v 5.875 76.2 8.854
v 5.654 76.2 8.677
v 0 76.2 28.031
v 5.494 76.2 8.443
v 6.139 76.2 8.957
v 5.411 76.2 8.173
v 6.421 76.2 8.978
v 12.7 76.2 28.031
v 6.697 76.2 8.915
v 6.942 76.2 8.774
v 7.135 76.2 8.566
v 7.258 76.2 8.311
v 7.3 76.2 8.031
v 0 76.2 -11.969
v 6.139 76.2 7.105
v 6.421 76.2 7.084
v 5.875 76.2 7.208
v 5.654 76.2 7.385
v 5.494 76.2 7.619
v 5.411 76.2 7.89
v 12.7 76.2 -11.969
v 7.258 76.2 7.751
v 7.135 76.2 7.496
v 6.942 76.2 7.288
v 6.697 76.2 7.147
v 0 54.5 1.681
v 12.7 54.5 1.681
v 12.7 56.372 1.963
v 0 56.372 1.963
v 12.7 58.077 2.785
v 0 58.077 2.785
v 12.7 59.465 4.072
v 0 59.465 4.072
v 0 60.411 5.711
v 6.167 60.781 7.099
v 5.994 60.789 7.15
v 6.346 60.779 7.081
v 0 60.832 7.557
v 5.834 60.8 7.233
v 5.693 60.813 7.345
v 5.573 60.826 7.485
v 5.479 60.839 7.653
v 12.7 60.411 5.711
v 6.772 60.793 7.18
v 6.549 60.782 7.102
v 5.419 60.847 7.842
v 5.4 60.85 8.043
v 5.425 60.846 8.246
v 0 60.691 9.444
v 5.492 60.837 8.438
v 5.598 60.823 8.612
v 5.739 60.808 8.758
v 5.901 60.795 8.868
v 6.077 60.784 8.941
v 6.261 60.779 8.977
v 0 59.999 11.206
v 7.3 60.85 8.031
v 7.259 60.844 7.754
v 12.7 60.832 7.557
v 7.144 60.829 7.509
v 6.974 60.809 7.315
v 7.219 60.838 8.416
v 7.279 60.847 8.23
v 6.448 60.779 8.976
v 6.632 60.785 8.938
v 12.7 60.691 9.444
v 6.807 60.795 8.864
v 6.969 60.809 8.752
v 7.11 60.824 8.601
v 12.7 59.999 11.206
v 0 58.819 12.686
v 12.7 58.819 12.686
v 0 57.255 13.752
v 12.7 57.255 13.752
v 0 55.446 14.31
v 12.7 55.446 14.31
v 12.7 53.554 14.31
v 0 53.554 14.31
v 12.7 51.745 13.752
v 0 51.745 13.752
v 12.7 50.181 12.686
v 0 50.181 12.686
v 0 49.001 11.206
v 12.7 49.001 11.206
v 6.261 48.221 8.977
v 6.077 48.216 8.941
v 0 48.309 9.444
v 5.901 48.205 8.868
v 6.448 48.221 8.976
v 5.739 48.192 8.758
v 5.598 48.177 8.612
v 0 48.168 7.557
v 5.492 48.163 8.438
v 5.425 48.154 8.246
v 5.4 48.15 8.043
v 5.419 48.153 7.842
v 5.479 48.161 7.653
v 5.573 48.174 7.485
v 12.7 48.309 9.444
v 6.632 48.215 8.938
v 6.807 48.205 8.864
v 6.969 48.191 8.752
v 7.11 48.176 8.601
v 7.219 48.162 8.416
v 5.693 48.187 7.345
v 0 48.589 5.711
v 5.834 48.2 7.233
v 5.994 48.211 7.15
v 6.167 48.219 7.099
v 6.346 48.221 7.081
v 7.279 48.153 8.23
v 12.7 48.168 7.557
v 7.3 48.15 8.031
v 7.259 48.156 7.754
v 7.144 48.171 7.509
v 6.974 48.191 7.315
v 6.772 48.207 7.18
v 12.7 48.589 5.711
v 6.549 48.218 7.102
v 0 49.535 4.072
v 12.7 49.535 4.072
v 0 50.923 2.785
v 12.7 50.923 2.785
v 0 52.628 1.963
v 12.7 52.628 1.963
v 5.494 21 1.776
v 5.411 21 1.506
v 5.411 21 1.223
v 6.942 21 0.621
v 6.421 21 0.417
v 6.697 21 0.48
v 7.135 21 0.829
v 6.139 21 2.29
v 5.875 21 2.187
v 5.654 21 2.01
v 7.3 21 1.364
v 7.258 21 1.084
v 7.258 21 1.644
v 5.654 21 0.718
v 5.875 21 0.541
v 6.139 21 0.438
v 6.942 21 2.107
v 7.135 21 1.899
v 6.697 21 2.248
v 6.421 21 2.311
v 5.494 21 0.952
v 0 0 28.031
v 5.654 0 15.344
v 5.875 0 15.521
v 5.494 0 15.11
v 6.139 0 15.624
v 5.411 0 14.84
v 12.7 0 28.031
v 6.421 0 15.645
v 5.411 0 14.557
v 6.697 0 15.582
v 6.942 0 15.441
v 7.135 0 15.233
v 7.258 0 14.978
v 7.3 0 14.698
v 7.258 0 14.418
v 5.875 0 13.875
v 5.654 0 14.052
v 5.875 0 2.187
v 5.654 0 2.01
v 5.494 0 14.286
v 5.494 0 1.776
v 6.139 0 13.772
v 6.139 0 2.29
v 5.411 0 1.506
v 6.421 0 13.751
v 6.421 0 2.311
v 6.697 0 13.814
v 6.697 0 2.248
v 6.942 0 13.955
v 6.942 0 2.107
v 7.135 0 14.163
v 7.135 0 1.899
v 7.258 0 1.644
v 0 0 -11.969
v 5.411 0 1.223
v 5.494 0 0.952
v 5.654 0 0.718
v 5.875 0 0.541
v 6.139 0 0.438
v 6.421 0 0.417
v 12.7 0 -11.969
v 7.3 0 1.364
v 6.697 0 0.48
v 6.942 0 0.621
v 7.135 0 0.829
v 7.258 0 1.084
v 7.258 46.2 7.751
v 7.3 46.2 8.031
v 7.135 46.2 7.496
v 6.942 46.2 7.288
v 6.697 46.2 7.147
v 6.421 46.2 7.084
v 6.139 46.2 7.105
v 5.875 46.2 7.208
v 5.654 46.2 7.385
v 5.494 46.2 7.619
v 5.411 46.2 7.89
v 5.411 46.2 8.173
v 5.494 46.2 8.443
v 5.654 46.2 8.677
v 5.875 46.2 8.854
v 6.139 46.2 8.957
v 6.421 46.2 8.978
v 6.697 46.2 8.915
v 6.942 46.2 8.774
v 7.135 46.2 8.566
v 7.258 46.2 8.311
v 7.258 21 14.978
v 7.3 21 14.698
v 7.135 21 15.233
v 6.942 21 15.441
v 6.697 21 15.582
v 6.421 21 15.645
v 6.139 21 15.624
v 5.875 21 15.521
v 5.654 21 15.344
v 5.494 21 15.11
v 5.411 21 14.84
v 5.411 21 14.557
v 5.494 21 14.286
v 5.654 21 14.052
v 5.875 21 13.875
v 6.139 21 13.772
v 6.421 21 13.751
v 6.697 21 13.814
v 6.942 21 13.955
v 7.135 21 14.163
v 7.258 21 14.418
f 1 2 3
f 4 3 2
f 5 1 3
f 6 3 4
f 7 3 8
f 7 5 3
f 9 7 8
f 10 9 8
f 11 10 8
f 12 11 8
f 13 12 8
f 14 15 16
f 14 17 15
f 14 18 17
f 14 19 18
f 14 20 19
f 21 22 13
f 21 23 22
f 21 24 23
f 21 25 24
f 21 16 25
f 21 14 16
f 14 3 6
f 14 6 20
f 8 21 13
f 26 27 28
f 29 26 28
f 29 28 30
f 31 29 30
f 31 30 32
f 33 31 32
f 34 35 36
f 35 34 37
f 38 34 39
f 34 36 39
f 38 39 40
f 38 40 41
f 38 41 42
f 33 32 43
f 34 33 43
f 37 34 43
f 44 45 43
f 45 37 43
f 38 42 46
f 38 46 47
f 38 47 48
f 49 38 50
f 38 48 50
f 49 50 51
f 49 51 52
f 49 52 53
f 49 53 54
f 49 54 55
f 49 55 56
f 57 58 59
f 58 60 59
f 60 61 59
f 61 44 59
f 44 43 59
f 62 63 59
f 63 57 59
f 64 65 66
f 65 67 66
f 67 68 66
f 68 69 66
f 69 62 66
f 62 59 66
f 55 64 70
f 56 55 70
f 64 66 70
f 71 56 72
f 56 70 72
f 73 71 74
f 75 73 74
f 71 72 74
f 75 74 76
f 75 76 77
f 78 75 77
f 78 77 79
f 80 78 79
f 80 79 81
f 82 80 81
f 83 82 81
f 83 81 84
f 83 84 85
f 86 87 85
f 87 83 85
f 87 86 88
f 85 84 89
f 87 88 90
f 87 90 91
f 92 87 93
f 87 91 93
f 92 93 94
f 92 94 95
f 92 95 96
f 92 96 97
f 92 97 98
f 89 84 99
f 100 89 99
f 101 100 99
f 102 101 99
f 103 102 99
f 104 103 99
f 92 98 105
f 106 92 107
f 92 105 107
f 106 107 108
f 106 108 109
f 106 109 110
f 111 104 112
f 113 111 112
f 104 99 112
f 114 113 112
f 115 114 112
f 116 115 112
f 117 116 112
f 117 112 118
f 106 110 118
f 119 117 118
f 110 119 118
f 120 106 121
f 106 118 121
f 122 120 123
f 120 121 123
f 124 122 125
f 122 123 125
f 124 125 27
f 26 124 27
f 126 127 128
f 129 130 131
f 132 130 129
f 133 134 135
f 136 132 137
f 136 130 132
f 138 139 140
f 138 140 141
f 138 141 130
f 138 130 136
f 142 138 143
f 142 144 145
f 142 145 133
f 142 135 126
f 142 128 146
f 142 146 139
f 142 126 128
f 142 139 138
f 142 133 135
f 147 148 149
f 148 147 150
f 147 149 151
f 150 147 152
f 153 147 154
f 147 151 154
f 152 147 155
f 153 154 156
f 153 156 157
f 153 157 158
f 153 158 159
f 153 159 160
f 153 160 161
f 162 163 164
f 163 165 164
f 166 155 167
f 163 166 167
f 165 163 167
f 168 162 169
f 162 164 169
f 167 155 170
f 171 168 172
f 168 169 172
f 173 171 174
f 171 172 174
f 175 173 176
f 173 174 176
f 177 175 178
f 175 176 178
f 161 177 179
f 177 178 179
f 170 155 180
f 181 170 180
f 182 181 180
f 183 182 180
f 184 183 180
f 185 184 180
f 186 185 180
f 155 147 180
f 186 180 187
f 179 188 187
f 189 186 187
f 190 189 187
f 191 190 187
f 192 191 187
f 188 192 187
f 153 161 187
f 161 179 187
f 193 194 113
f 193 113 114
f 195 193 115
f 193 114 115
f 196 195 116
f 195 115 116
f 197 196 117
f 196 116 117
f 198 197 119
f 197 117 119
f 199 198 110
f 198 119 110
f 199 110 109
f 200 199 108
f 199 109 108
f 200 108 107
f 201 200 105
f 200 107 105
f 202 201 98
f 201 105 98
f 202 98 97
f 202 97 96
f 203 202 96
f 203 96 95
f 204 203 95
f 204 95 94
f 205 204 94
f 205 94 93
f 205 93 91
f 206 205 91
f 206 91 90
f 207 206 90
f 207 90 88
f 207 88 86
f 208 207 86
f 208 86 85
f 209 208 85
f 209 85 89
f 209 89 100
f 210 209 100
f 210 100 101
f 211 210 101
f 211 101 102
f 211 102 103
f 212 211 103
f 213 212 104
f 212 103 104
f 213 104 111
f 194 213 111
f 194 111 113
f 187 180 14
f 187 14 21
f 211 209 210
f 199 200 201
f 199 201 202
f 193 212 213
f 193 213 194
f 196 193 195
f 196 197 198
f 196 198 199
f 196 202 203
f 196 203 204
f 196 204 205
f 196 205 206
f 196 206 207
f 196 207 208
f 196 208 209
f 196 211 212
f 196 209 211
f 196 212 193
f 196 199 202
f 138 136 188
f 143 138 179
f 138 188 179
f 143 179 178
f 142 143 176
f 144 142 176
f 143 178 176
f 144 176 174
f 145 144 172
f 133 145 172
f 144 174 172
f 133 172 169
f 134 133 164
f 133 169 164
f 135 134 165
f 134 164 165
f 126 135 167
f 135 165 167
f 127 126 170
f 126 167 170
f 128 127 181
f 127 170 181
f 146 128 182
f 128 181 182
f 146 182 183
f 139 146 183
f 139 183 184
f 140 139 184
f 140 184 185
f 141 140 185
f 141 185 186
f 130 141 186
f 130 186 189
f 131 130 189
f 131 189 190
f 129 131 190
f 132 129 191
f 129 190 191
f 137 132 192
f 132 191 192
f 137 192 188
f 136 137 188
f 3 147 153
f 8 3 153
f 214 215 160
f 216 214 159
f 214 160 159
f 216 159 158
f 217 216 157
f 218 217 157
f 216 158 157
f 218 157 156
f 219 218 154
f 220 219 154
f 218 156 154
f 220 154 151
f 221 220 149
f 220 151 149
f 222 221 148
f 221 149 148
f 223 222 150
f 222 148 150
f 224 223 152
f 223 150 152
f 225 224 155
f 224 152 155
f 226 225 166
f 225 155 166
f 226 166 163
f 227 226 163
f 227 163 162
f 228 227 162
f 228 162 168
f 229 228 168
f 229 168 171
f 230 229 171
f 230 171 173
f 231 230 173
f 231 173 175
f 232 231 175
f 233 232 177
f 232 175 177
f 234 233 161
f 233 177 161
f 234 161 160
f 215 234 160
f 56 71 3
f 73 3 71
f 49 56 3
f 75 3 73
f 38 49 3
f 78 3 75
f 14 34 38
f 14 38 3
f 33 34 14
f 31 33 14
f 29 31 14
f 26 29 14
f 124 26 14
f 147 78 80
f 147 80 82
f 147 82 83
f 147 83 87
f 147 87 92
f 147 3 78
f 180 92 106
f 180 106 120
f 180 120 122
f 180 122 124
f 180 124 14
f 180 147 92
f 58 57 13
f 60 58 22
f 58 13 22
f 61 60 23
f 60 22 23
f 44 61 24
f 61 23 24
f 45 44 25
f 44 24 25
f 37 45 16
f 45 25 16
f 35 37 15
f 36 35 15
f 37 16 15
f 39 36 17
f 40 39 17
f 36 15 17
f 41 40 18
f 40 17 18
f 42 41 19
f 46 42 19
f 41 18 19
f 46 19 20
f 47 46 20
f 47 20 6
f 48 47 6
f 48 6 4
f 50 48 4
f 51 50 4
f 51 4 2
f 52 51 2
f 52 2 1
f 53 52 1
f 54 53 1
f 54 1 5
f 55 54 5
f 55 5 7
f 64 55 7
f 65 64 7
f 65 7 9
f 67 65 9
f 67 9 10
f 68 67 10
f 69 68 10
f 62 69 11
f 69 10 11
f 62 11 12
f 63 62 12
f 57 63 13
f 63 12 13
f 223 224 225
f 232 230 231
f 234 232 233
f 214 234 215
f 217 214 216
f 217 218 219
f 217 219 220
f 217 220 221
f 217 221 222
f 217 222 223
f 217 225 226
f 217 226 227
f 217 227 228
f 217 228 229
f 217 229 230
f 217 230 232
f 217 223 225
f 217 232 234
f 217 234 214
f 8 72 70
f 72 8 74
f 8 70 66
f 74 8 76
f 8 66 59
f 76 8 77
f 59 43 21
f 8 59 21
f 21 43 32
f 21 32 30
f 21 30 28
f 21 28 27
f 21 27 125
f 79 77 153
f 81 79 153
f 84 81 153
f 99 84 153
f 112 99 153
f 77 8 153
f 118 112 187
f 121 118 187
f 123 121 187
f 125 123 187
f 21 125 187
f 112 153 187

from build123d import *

# Parameters (mm, degrees)
SKETCH11_W          = 12.7
SKETCH11_H          = 40
BOSS_EXTRUDE2_DEPTH = 76.2
SKETCH12_R          = 6.35
CUT_EXTRUDE5_DEPTH  = 13.7
SKETCH13_R          = 0.95
CUT_EXTRUDE6_DEPTH  = 30
SKETCH17_R          = 0.95
CUT_EXTRUDE8_DEPTH  = 21


with BuildPart() as part:
    # Sketch11 → Boss-Extrude2 (new body)
    with BuildSketch(Plane(origin=(0, 0, 0), x_dir=(1, 0, 0), z_dir=(0, 1, 0))):
        with Locations((6.35, -8.031139822)):
            Rectangle(SKETCH11_W, SKETCH11_H)
    extrude(amount=BOSS_EXTRUDE2_DEPTH)

    # Sketch12 → Cut-Extrude5 (cut, through all)
    with BuildSketch(Plane(origin=(12.7, 0, 0), x_dir=(0, 0, -1), z_dir=(1, 0, 0))):
        with Locations((-8.031139822, 54.5)):
            Circle(SKETCH12_R)
    extrude(amount=-CUT_EXTRUDE5_DEPTH, mode=Mode.SUBTRACT)

    # Sketch13 → Cut-Extrude6 (cut)
    with BuildSketch(Plane(origin=(0, 76.2, 0), x_dir=(1, 0, 0), z_dir=(0, 1, 0))):
        with Locations((6.35, -8.031139822)):
            Circle(SKETCH13_R)
    extrude(amount=-CUT_EXTRUDE6_DEPTH, mode=Mode.SUBTRACT)

    # Sketch17 → Cut-Extrude8 (cut)
    with BuildSketch(Plane.XZ):
        with Locations((6.35, 14.698139822)):
            Circle(SKETCH17_R)
        with Locations((6.35, 1.364139822)):
            Circle(SKETCH17_R)
    extrude(amount=-CUT_EXTRUDE8_DEPTH, mode=Mode.SUBTRACT)


solid = part.part
